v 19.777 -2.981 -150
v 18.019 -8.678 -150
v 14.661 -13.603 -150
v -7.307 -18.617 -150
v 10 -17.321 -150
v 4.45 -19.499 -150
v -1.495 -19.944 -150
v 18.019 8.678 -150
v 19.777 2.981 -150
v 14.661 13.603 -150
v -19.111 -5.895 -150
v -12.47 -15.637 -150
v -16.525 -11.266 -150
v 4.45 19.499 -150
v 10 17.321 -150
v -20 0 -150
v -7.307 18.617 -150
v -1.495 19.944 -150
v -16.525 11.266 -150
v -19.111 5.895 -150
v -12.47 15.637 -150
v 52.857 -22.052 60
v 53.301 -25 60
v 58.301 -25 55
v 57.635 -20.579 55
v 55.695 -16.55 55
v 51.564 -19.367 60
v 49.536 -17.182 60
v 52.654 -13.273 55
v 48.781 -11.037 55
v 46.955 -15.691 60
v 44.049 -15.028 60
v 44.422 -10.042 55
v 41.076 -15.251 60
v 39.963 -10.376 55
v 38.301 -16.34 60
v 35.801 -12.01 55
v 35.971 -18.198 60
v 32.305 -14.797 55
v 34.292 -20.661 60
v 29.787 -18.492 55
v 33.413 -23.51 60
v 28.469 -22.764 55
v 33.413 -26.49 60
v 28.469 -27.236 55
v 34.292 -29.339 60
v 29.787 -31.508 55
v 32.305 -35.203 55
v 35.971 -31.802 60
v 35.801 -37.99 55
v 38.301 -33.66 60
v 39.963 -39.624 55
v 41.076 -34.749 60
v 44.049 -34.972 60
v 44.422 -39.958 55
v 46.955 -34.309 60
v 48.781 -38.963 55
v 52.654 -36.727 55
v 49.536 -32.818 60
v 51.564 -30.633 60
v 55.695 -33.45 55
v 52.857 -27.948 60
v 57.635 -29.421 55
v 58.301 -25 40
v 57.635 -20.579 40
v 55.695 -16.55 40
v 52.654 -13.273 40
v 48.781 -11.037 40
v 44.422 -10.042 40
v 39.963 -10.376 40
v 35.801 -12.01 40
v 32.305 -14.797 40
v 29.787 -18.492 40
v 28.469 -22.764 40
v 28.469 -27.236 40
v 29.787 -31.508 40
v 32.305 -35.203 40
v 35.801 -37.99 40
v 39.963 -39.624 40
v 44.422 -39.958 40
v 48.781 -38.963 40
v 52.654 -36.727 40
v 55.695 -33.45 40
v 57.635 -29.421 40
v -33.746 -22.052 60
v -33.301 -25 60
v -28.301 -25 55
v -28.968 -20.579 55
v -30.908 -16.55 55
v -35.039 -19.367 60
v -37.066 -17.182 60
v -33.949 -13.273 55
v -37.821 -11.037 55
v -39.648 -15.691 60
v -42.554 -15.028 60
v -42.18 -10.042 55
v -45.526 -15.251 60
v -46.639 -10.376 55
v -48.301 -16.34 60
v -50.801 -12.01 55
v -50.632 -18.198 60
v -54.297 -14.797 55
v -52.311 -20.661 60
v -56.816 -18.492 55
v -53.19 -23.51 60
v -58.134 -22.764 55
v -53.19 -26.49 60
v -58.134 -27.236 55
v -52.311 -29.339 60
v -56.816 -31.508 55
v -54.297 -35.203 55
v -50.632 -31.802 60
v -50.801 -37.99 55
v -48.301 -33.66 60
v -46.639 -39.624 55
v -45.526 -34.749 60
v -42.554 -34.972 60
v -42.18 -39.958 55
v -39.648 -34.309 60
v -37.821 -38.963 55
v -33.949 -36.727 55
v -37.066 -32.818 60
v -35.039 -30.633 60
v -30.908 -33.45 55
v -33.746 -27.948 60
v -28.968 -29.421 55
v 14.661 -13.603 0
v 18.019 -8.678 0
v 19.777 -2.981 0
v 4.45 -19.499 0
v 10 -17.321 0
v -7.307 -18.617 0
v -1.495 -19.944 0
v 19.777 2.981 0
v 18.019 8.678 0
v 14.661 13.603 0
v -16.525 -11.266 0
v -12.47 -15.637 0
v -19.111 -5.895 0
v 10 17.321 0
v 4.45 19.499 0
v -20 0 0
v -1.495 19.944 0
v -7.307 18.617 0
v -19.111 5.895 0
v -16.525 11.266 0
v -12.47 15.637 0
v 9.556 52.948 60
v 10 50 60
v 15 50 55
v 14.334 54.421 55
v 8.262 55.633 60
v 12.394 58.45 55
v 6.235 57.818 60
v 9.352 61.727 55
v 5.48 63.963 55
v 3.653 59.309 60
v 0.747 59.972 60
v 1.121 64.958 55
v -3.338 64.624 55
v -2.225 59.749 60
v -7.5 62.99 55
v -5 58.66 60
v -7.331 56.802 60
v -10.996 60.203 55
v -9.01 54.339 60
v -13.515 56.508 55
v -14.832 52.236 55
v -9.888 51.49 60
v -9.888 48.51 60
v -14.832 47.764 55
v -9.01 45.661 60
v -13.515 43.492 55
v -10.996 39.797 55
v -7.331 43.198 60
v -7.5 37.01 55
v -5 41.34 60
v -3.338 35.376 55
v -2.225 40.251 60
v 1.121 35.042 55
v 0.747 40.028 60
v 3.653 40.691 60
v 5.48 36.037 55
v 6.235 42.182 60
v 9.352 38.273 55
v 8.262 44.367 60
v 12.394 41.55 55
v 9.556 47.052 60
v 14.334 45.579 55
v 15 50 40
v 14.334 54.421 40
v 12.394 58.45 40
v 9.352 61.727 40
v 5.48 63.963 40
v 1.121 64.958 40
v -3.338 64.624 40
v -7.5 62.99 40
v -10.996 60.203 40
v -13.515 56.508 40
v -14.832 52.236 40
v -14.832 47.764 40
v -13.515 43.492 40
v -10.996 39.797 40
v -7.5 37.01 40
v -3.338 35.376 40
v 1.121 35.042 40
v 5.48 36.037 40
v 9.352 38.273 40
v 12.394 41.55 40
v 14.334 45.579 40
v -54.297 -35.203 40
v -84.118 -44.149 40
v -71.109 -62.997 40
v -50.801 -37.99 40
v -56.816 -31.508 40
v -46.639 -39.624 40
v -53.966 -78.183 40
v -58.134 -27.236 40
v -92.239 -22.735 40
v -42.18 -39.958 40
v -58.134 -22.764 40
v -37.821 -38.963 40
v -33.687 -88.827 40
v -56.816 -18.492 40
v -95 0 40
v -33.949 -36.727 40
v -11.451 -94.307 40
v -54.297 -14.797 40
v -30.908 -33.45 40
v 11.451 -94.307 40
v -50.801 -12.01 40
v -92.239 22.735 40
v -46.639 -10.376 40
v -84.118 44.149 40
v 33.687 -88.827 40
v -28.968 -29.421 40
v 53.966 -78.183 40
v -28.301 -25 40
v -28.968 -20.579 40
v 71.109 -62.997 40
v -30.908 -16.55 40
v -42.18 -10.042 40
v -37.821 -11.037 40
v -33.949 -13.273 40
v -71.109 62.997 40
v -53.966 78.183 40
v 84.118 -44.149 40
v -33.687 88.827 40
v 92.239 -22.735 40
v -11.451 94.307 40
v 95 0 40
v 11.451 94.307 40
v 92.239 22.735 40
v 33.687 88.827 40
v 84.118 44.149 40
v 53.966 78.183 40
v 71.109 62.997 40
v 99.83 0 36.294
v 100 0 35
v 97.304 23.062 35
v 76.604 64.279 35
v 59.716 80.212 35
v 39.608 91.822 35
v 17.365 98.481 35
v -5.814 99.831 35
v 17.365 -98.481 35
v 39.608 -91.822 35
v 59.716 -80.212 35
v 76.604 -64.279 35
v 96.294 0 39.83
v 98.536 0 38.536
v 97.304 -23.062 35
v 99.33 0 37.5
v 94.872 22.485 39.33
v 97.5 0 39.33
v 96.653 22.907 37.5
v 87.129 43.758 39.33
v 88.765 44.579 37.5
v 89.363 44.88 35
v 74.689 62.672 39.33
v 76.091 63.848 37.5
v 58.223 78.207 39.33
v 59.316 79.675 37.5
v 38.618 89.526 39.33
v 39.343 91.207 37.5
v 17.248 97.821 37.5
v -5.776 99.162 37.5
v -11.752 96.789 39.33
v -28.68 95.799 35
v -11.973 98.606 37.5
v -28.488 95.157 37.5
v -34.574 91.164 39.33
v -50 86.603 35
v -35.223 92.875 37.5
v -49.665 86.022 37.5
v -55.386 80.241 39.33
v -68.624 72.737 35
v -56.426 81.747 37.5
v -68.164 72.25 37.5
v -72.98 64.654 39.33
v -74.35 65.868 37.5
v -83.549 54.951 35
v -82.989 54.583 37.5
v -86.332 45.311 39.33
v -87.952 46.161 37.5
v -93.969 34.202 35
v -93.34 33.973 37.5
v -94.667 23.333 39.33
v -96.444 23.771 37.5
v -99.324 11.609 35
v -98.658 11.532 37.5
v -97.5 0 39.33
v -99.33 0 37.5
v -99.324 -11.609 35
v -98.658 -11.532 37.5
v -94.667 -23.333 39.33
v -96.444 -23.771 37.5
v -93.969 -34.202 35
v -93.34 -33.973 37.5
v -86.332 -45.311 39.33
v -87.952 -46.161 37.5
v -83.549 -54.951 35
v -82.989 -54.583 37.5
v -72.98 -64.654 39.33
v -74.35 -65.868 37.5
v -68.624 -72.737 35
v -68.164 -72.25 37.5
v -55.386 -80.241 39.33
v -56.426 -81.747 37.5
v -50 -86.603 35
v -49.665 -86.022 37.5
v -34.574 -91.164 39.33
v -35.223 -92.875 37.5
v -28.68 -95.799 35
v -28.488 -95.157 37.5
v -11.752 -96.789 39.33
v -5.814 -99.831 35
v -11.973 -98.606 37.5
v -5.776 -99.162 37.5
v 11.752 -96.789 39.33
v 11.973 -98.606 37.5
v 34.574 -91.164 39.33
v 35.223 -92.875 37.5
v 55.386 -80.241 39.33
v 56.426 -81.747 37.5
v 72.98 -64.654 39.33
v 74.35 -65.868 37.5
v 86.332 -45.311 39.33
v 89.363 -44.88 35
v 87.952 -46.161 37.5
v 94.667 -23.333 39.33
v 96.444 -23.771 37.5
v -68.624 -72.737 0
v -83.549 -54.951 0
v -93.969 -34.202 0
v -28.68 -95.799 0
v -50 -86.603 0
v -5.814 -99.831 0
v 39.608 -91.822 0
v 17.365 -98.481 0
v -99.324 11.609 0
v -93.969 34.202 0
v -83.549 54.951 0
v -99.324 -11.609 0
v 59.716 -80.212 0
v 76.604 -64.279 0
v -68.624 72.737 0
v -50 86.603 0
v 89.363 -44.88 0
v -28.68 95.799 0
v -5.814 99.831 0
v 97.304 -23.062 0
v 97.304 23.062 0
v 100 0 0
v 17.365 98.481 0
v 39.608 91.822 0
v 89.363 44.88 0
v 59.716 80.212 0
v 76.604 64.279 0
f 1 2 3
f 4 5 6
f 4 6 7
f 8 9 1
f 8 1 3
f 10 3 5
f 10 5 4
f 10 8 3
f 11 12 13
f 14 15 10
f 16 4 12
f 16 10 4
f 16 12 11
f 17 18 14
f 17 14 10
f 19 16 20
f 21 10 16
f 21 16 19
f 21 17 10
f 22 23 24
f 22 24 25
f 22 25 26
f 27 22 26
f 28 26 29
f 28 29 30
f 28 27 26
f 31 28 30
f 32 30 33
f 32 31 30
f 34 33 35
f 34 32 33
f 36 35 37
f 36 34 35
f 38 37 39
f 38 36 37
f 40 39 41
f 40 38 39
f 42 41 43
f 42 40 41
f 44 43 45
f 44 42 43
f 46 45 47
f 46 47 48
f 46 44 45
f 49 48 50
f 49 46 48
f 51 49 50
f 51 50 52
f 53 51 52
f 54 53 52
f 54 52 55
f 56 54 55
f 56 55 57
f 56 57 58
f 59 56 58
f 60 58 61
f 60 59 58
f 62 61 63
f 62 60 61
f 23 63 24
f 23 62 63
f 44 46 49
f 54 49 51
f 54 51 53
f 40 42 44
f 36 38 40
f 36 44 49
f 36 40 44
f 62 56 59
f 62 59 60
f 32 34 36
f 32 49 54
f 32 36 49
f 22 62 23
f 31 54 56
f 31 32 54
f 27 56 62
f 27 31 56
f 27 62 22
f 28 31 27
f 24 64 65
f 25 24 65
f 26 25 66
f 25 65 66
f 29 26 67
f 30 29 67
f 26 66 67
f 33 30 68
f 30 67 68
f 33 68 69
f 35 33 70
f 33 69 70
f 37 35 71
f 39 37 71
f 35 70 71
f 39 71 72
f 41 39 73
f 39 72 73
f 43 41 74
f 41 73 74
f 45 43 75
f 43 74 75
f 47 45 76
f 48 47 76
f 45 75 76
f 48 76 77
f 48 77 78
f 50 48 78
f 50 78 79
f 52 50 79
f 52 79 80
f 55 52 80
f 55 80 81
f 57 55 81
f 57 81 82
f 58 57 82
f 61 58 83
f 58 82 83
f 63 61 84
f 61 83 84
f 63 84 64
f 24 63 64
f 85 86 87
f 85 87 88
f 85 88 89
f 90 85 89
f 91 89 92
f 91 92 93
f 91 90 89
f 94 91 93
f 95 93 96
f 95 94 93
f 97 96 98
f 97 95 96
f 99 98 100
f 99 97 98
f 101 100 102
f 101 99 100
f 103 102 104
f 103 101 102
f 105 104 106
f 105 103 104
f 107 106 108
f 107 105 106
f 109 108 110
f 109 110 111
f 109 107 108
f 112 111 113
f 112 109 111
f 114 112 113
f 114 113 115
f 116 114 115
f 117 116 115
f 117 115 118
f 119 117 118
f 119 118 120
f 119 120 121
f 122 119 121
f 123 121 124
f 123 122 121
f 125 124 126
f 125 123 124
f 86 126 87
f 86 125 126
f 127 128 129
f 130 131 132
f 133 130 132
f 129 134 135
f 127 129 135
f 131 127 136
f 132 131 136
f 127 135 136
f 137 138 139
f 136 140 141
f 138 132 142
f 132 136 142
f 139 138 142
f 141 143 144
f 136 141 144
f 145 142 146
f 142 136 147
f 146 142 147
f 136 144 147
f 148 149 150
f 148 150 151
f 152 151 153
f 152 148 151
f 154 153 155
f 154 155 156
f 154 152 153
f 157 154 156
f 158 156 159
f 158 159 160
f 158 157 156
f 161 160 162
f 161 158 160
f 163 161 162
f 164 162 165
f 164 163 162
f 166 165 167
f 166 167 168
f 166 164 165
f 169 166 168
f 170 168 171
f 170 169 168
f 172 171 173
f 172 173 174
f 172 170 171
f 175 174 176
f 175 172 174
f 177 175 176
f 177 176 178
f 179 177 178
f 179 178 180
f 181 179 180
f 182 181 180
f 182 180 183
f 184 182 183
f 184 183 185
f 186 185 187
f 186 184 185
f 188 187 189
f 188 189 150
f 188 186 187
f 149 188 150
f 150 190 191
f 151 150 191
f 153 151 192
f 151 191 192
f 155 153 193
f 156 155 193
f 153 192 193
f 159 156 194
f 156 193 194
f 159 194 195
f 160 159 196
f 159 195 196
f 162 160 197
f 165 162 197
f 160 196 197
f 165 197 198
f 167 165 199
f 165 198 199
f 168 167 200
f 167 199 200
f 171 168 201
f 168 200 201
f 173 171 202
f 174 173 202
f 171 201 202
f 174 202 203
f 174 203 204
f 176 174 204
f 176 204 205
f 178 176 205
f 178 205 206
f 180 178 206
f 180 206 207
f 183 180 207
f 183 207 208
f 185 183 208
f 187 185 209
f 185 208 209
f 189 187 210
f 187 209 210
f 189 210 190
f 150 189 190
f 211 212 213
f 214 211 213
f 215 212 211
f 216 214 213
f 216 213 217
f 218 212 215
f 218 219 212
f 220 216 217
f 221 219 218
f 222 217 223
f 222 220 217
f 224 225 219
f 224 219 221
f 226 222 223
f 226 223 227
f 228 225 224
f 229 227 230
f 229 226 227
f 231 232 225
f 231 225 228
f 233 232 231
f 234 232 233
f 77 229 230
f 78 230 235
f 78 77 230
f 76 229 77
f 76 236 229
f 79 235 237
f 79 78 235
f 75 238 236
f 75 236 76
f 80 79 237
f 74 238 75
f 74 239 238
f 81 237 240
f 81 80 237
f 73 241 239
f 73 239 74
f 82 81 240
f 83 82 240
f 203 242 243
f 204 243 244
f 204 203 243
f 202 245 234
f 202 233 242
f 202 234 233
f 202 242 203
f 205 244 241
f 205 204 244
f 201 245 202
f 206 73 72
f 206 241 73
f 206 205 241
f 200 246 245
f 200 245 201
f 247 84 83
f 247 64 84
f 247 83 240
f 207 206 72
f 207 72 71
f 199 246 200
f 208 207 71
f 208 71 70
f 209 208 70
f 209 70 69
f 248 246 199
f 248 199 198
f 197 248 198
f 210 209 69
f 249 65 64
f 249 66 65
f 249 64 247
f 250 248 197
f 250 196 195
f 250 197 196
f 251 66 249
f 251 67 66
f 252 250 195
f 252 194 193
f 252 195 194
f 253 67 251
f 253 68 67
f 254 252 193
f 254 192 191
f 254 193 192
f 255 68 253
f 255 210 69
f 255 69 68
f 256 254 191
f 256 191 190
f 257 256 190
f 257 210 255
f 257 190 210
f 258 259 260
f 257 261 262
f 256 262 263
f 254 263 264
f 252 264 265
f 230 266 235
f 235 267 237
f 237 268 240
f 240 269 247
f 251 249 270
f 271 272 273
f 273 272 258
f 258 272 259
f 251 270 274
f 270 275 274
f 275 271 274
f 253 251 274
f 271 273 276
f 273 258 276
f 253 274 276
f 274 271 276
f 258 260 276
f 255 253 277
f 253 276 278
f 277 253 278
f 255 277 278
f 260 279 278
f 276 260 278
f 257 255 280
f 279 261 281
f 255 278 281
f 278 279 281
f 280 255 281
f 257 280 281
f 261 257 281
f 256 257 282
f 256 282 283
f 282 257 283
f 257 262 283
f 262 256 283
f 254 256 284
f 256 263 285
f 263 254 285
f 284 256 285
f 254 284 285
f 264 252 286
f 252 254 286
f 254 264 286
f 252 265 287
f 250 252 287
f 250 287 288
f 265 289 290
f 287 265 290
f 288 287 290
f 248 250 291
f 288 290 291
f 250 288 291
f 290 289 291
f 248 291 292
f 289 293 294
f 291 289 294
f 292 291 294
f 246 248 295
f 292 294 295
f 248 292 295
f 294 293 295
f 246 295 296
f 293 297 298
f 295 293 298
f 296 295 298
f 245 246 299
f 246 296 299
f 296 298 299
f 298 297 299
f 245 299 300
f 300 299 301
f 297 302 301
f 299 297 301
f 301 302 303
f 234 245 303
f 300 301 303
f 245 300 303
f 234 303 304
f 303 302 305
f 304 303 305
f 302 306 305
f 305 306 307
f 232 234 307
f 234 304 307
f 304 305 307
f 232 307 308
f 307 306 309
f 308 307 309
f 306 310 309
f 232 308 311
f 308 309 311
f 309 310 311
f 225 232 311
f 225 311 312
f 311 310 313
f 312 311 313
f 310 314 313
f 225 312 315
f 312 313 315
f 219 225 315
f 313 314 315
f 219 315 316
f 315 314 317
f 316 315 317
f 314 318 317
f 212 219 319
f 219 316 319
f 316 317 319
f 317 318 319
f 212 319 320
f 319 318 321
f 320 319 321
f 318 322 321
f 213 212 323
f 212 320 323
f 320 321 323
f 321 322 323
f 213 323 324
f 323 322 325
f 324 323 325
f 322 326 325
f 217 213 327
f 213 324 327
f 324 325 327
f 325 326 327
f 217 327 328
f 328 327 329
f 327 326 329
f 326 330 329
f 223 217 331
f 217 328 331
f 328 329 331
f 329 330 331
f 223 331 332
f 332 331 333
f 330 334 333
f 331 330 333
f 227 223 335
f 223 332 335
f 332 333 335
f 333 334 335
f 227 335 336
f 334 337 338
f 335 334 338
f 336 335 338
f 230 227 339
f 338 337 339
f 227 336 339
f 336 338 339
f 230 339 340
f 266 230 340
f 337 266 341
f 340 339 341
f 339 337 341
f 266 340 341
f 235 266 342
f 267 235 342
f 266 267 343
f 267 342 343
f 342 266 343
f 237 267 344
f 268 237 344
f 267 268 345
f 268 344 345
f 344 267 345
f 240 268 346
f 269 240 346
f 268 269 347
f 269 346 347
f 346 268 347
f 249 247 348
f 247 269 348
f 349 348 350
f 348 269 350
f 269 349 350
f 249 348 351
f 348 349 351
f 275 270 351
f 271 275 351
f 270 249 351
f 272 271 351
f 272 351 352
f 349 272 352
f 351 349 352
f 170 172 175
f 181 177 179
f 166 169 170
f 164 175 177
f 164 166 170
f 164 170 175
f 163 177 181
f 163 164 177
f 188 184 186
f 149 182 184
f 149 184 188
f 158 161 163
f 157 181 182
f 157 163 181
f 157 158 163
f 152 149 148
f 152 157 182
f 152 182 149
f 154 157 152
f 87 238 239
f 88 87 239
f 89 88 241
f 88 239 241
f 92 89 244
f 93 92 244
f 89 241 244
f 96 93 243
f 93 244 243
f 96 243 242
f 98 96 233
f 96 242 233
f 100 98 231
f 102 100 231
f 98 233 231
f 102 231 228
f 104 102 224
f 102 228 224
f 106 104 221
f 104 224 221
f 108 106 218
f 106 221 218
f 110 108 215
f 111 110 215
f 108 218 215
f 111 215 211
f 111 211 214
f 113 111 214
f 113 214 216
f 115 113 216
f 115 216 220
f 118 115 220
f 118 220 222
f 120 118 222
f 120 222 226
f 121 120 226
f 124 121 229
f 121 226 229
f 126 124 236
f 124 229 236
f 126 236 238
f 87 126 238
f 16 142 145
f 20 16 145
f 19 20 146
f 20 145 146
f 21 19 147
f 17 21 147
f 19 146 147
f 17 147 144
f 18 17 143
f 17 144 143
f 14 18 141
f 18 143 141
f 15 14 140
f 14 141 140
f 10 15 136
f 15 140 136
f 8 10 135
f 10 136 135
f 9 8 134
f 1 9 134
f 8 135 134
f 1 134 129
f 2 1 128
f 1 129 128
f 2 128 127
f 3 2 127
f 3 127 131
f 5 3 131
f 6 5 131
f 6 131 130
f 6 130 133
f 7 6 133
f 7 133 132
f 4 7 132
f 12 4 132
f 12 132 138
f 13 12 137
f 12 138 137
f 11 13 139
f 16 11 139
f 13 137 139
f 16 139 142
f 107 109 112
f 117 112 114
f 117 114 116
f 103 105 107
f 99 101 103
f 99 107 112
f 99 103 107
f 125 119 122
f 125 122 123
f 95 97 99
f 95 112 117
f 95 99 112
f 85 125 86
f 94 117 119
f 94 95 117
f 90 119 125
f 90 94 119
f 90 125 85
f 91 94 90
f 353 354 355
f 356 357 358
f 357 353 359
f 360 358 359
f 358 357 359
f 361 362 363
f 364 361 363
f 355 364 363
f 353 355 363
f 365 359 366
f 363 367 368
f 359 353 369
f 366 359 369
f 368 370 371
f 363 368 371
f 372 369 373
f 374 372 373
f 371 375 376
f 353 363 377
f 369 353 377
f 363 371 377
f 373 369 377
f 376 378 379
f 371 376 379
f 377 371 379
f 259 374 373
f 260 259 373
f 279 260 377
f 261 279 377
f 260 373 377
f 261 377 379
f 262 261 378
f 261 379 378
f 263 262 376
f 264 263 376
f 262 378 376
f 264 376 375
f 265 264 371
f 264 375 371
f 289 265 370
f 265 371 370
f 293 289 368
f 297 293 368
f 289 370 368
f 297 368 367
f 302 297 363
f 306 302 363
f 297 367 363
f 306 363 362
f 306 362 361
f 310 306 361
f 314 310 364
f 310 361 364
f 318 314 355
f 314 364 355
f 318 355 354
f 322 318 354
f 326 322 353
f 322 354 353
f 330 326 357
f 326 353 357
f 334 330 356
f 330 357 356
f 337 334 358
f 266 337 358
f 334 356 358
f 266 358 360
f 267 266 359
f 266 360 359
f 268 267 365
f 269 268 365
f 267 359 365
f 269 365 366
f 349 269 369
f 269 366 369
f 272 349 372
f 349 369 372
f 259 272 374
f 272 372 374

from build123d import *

# Parameters (mm, degrees)
SKETCH1_R           = 100
BOSS_EXTRUDE1_DEPTH = 40
SKETCH2_R           = 15
BOSS_EXTRUDE2_DEPTH = 20
SKETCH3_R           = 20
BOSS_EXTRUDE3_DEPTH = 150
CHAMFER1_SIZE       = 5
FILLET1_R           = 5


with BuildPart() as part:
    # Sketch1 → Boss-Extrude1 (new body)
    with BuildSketch(Plane.XY):
        Circle(SKETCH1_R)
    extrude(amount=BOSS_EXTRUDE1_DEPTH)

    # Sketch2 → Boss-Extrude2 (add)
    with BuildSketch(Plane.XY.offset(40)):
        with Locations((0, 50)):
            Circle(SKETCH2_R)
        with Locations((43.301270189, -25)):
            Circle(SKETCH2_R)
        with Locations((-43.301270189, -25)):
            Circle(SKETCH2_R)
    extrude(amount=BOSS_EXTRUDE2_DEPTH)

    # Chamfer1
    chamfer1_edges = [part.edges().sort_by_distance(p)[0] for p in [
        (-58.301270189, -25, 60),
        (-15, 50, 60),
        (28.301270189, -25, 60),
    ]]
    chamfer(chamfer1_edges, length=CHAMFER1_SIZE)

    # Fillet1
    fillet1_edges = [part.edges().sort_by_distance(p)[0] for p in [
        (-100, 0, 40),
    ]]
    fillet(fillet1_edges, radius=FILLET1_R)


with BuildPart() as body_2:
    # Sketch3 → Boss-Extrude3 (new body)
    with BuildSketch(Plane(origin=(0, 0, 0), x_dir=(-1, 0, 0), z_dir=(0, 0, -1))):
        Circle(SKETCH3_R)
    extrude(amount=BOSS_EXTRUDE3_DEPTH)


solid = Compound([part.part, body_2.part])
